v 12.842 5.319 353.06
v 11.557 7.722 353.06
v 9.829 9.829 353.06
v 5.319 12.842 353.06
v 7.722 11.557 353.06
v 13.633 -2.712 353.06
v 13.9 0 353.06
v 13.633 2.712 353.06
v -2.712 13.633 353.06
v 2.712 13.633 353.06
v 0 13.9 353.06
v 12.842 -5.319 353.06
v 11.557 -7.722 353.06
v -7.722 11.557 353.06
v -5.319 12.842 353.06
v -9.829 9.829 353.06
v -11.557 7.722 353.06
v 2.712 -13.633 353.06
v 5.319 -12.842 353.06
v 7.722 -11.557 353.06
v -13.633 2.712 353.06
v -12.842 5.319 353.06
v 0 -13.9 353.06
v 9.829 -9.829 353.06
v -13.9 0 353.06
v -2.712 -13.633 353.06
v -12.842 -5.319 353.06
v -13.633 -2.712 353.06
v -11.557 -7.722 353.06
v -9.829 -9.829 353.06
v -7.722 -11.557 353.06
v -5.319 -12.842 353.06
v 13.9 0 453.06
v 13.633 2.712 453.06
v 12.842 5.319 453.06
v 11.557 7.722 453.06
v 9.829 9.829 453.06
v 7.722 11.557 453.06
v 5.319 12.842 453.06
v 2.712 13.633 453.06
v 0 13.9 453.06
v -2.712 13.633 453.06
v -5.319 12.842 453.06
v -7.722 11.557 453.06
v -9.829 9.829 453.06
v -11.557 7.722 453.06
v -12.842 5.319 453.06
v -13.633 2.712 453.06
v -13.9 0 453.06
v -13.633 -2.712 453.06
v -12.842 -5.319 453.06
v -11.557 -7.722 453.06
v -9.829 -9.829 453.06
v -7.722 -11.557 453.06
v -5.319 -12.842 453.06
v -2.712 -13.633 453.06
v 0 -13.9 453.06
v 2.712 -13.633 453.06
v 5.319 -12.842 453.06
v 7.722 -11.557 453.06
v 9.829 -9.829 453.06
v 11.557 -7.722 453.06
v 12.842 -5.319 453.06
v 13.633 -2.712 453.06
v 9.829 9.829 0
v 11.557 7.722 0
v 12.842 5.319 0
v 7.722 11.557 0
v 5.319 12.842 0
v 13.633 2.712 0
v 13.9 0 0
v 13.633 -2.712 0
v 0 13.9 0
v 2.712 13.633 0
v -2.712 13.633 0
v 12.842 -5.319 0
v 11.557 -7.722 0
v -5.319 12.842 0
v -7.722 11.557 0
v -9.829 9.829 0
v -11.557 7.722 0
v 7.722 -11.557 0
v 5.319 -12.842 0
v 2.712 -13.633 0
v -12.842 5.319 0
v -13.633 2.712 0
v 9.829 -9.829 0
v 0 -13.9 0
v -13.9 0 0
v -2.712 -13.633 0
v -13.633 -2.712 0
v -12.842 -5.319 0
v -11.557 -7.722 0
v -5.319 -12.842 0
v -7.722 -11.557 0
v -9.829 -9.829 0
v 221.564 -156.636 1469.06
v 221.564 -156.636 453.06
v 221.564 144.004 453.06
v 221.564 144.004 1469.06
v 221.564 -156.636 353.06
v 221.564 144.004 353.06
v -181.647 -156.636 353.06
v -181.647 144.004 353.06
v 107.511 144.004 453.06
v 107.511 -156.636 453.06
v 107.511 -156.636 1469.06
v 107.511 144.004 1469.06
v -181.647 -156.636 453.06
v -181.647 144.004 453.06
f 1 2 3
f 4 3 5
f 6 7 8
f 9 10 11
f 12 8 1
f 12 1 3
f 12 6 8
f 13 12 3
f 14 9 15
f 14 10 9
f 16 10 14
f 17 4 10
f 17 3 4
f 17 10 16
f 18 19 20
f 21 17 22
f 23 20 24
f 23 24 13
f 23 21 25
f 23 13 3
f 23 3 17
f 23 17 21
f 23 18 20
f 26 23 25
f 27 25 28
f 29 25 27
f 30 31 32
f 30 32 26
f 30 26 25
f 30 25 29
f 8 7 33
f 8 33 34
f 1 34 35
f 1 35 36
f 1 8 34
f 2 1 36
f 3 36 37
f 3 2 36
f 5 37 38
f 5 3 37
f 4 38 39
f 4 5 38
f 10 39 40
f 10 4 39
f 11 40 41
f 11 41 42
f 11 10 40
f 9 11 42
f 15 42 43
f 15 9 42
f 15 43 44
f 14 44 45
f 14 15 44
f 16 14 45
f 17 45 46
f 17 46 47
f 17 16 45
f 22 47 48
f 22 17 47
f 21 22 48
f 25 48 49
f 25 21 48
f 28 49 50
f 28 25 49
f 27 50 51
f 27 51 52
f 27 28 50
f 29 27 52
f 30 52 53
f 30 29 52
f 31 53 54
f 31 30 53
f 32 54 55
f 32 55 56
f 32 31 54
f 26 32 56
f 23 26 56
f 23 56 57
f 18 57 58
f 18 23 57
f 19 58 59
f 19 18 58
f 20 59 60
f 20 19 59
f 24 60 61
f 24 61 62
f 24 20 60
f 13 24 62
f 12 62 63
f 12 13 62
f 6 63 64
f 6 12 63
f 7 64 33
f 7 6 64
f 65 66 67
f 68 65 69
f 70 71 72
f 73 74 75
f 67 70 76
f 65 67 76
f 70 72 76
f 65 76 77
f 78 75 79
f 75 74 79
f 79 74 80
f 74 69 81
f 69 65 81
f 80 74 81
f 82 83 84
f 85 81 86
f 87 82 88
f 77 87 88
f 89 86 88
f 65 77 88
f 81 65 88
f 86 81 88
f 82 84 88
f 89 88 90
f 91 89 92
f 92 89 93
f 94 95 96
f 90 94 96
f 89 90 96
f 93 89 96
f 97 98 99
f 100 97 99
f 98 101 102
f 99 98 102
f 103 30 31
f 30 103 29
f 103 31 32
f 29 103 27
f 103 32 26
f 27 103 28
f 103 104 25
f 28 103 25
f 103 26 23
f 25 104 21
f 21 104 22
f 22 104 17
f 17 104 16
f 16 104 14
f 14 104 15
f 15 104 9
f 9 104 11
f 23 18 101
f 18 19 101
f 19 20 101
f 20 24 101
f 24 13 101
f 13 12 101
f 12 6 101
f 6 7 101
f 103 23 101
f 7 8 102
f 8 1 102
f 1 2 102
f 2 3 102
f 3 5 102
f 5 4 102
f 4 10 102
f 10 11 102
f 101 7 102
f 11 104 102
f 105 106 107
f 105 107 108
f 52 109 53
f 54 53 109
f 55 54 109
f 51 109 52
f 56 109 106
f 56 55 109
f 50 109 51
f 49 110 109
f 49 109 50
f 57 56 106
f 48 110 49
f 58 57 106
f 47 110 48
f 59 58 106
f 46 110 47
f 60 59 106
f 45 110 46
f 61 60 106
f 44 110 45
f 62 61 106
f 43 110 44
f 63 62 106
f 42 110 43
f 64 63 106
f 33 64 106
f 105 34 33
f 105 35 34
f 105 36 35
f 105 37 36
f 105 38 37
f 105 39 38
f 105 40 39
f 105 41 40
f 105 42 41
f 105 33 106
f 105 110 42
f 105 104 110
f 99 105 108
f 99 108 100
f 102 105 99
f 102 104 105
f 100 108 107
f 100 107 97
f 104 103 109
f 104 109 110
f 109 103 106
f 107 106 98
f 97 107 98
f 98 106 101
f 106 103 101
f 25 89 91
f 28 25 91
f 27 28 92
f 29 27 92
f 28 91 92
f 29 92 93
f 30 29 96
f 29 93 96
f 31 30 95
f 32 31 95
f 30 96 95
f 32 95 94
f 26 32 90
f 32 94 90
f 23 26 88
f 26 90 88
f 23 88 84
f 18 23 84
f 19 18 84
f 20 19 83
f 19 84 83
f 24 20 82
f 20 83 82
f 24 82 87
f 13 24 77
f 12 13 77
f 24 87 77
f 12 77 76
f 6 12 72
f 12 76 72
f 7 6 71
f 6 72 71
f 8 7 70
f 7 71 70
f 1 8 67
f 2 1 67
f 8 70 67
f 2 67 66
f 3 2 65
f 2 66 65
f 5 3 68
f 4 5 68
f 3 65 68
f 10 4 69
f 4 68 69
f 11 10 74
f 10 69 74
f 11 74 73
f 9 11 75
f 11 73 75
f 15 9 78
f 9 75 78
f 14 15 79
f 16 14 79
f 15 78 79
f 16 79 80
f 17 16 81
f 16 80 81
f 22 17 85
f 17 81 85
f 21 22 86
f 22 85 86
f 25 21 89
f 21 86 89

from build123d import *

# Parameters (mm, degrees)
SKETCH1_R           = 1.39
BOSS_EXTRUDE1_DEPTH = 35.306
SKETCH2_W           = 40.321108922
SKETCH2_H           = 30.063984723
SKETCH2_R           = 1.39
BOSS_EXTRUDE2_DEPTH = 10
SKETCH3_W           = 11.405344709
SKETCH3_H           = 30.063984723
BOSS_EXTRUDE3_DEPTH = 101.6
SCALE2_SCALE        = 10


with BuildPart() as part:
    # Sketch1 → Boss-Extrude1 (new body)
    with BuildSketch(Plane.XY):
        Circle(SKETCH1_R)
    extrude(amount=BOSS_EXTRUDE1_DEPTH)


with BuildPart() as body_2:
    # Sketch2 → Boss-Extrude2 (new body)
    with BuildSketch(Plane.XY.offset(35.306)):
        with Locations((1.995844364, -0.631596318)):
            Rectangle(SKETCH2_W, SKETCH2_H)
        Circle(SKETCH2_R, mode=Mode.SUBTRACT)
    extrude(amount=BOSS_EXTRUDE2_DEPTH)

    # Sketch3 → Boss-Extrude3 (add)
    with BuildSketch(Plane.XY.offset(45.306)):
        with Locations((16.453726471, -0.631596318)):
            Rectangle(SKETCH3_W, SKETCH3_H)
    extrude(amount=BOSS_EXTRUDE3_DEPTH)


with BuildPart() as body_2_1:
    # Scale2: scaled about (0, 0, 0)
    add(body_2.part.scale(SCALE2_SCALE))


with BuildPart() as part_1:
    # Scale2: scaled about (0, 0, 0)
    add(part.part.scale(SCALE2_SCALE))


solid = Compound([body_2_1.part, part_1.part])
